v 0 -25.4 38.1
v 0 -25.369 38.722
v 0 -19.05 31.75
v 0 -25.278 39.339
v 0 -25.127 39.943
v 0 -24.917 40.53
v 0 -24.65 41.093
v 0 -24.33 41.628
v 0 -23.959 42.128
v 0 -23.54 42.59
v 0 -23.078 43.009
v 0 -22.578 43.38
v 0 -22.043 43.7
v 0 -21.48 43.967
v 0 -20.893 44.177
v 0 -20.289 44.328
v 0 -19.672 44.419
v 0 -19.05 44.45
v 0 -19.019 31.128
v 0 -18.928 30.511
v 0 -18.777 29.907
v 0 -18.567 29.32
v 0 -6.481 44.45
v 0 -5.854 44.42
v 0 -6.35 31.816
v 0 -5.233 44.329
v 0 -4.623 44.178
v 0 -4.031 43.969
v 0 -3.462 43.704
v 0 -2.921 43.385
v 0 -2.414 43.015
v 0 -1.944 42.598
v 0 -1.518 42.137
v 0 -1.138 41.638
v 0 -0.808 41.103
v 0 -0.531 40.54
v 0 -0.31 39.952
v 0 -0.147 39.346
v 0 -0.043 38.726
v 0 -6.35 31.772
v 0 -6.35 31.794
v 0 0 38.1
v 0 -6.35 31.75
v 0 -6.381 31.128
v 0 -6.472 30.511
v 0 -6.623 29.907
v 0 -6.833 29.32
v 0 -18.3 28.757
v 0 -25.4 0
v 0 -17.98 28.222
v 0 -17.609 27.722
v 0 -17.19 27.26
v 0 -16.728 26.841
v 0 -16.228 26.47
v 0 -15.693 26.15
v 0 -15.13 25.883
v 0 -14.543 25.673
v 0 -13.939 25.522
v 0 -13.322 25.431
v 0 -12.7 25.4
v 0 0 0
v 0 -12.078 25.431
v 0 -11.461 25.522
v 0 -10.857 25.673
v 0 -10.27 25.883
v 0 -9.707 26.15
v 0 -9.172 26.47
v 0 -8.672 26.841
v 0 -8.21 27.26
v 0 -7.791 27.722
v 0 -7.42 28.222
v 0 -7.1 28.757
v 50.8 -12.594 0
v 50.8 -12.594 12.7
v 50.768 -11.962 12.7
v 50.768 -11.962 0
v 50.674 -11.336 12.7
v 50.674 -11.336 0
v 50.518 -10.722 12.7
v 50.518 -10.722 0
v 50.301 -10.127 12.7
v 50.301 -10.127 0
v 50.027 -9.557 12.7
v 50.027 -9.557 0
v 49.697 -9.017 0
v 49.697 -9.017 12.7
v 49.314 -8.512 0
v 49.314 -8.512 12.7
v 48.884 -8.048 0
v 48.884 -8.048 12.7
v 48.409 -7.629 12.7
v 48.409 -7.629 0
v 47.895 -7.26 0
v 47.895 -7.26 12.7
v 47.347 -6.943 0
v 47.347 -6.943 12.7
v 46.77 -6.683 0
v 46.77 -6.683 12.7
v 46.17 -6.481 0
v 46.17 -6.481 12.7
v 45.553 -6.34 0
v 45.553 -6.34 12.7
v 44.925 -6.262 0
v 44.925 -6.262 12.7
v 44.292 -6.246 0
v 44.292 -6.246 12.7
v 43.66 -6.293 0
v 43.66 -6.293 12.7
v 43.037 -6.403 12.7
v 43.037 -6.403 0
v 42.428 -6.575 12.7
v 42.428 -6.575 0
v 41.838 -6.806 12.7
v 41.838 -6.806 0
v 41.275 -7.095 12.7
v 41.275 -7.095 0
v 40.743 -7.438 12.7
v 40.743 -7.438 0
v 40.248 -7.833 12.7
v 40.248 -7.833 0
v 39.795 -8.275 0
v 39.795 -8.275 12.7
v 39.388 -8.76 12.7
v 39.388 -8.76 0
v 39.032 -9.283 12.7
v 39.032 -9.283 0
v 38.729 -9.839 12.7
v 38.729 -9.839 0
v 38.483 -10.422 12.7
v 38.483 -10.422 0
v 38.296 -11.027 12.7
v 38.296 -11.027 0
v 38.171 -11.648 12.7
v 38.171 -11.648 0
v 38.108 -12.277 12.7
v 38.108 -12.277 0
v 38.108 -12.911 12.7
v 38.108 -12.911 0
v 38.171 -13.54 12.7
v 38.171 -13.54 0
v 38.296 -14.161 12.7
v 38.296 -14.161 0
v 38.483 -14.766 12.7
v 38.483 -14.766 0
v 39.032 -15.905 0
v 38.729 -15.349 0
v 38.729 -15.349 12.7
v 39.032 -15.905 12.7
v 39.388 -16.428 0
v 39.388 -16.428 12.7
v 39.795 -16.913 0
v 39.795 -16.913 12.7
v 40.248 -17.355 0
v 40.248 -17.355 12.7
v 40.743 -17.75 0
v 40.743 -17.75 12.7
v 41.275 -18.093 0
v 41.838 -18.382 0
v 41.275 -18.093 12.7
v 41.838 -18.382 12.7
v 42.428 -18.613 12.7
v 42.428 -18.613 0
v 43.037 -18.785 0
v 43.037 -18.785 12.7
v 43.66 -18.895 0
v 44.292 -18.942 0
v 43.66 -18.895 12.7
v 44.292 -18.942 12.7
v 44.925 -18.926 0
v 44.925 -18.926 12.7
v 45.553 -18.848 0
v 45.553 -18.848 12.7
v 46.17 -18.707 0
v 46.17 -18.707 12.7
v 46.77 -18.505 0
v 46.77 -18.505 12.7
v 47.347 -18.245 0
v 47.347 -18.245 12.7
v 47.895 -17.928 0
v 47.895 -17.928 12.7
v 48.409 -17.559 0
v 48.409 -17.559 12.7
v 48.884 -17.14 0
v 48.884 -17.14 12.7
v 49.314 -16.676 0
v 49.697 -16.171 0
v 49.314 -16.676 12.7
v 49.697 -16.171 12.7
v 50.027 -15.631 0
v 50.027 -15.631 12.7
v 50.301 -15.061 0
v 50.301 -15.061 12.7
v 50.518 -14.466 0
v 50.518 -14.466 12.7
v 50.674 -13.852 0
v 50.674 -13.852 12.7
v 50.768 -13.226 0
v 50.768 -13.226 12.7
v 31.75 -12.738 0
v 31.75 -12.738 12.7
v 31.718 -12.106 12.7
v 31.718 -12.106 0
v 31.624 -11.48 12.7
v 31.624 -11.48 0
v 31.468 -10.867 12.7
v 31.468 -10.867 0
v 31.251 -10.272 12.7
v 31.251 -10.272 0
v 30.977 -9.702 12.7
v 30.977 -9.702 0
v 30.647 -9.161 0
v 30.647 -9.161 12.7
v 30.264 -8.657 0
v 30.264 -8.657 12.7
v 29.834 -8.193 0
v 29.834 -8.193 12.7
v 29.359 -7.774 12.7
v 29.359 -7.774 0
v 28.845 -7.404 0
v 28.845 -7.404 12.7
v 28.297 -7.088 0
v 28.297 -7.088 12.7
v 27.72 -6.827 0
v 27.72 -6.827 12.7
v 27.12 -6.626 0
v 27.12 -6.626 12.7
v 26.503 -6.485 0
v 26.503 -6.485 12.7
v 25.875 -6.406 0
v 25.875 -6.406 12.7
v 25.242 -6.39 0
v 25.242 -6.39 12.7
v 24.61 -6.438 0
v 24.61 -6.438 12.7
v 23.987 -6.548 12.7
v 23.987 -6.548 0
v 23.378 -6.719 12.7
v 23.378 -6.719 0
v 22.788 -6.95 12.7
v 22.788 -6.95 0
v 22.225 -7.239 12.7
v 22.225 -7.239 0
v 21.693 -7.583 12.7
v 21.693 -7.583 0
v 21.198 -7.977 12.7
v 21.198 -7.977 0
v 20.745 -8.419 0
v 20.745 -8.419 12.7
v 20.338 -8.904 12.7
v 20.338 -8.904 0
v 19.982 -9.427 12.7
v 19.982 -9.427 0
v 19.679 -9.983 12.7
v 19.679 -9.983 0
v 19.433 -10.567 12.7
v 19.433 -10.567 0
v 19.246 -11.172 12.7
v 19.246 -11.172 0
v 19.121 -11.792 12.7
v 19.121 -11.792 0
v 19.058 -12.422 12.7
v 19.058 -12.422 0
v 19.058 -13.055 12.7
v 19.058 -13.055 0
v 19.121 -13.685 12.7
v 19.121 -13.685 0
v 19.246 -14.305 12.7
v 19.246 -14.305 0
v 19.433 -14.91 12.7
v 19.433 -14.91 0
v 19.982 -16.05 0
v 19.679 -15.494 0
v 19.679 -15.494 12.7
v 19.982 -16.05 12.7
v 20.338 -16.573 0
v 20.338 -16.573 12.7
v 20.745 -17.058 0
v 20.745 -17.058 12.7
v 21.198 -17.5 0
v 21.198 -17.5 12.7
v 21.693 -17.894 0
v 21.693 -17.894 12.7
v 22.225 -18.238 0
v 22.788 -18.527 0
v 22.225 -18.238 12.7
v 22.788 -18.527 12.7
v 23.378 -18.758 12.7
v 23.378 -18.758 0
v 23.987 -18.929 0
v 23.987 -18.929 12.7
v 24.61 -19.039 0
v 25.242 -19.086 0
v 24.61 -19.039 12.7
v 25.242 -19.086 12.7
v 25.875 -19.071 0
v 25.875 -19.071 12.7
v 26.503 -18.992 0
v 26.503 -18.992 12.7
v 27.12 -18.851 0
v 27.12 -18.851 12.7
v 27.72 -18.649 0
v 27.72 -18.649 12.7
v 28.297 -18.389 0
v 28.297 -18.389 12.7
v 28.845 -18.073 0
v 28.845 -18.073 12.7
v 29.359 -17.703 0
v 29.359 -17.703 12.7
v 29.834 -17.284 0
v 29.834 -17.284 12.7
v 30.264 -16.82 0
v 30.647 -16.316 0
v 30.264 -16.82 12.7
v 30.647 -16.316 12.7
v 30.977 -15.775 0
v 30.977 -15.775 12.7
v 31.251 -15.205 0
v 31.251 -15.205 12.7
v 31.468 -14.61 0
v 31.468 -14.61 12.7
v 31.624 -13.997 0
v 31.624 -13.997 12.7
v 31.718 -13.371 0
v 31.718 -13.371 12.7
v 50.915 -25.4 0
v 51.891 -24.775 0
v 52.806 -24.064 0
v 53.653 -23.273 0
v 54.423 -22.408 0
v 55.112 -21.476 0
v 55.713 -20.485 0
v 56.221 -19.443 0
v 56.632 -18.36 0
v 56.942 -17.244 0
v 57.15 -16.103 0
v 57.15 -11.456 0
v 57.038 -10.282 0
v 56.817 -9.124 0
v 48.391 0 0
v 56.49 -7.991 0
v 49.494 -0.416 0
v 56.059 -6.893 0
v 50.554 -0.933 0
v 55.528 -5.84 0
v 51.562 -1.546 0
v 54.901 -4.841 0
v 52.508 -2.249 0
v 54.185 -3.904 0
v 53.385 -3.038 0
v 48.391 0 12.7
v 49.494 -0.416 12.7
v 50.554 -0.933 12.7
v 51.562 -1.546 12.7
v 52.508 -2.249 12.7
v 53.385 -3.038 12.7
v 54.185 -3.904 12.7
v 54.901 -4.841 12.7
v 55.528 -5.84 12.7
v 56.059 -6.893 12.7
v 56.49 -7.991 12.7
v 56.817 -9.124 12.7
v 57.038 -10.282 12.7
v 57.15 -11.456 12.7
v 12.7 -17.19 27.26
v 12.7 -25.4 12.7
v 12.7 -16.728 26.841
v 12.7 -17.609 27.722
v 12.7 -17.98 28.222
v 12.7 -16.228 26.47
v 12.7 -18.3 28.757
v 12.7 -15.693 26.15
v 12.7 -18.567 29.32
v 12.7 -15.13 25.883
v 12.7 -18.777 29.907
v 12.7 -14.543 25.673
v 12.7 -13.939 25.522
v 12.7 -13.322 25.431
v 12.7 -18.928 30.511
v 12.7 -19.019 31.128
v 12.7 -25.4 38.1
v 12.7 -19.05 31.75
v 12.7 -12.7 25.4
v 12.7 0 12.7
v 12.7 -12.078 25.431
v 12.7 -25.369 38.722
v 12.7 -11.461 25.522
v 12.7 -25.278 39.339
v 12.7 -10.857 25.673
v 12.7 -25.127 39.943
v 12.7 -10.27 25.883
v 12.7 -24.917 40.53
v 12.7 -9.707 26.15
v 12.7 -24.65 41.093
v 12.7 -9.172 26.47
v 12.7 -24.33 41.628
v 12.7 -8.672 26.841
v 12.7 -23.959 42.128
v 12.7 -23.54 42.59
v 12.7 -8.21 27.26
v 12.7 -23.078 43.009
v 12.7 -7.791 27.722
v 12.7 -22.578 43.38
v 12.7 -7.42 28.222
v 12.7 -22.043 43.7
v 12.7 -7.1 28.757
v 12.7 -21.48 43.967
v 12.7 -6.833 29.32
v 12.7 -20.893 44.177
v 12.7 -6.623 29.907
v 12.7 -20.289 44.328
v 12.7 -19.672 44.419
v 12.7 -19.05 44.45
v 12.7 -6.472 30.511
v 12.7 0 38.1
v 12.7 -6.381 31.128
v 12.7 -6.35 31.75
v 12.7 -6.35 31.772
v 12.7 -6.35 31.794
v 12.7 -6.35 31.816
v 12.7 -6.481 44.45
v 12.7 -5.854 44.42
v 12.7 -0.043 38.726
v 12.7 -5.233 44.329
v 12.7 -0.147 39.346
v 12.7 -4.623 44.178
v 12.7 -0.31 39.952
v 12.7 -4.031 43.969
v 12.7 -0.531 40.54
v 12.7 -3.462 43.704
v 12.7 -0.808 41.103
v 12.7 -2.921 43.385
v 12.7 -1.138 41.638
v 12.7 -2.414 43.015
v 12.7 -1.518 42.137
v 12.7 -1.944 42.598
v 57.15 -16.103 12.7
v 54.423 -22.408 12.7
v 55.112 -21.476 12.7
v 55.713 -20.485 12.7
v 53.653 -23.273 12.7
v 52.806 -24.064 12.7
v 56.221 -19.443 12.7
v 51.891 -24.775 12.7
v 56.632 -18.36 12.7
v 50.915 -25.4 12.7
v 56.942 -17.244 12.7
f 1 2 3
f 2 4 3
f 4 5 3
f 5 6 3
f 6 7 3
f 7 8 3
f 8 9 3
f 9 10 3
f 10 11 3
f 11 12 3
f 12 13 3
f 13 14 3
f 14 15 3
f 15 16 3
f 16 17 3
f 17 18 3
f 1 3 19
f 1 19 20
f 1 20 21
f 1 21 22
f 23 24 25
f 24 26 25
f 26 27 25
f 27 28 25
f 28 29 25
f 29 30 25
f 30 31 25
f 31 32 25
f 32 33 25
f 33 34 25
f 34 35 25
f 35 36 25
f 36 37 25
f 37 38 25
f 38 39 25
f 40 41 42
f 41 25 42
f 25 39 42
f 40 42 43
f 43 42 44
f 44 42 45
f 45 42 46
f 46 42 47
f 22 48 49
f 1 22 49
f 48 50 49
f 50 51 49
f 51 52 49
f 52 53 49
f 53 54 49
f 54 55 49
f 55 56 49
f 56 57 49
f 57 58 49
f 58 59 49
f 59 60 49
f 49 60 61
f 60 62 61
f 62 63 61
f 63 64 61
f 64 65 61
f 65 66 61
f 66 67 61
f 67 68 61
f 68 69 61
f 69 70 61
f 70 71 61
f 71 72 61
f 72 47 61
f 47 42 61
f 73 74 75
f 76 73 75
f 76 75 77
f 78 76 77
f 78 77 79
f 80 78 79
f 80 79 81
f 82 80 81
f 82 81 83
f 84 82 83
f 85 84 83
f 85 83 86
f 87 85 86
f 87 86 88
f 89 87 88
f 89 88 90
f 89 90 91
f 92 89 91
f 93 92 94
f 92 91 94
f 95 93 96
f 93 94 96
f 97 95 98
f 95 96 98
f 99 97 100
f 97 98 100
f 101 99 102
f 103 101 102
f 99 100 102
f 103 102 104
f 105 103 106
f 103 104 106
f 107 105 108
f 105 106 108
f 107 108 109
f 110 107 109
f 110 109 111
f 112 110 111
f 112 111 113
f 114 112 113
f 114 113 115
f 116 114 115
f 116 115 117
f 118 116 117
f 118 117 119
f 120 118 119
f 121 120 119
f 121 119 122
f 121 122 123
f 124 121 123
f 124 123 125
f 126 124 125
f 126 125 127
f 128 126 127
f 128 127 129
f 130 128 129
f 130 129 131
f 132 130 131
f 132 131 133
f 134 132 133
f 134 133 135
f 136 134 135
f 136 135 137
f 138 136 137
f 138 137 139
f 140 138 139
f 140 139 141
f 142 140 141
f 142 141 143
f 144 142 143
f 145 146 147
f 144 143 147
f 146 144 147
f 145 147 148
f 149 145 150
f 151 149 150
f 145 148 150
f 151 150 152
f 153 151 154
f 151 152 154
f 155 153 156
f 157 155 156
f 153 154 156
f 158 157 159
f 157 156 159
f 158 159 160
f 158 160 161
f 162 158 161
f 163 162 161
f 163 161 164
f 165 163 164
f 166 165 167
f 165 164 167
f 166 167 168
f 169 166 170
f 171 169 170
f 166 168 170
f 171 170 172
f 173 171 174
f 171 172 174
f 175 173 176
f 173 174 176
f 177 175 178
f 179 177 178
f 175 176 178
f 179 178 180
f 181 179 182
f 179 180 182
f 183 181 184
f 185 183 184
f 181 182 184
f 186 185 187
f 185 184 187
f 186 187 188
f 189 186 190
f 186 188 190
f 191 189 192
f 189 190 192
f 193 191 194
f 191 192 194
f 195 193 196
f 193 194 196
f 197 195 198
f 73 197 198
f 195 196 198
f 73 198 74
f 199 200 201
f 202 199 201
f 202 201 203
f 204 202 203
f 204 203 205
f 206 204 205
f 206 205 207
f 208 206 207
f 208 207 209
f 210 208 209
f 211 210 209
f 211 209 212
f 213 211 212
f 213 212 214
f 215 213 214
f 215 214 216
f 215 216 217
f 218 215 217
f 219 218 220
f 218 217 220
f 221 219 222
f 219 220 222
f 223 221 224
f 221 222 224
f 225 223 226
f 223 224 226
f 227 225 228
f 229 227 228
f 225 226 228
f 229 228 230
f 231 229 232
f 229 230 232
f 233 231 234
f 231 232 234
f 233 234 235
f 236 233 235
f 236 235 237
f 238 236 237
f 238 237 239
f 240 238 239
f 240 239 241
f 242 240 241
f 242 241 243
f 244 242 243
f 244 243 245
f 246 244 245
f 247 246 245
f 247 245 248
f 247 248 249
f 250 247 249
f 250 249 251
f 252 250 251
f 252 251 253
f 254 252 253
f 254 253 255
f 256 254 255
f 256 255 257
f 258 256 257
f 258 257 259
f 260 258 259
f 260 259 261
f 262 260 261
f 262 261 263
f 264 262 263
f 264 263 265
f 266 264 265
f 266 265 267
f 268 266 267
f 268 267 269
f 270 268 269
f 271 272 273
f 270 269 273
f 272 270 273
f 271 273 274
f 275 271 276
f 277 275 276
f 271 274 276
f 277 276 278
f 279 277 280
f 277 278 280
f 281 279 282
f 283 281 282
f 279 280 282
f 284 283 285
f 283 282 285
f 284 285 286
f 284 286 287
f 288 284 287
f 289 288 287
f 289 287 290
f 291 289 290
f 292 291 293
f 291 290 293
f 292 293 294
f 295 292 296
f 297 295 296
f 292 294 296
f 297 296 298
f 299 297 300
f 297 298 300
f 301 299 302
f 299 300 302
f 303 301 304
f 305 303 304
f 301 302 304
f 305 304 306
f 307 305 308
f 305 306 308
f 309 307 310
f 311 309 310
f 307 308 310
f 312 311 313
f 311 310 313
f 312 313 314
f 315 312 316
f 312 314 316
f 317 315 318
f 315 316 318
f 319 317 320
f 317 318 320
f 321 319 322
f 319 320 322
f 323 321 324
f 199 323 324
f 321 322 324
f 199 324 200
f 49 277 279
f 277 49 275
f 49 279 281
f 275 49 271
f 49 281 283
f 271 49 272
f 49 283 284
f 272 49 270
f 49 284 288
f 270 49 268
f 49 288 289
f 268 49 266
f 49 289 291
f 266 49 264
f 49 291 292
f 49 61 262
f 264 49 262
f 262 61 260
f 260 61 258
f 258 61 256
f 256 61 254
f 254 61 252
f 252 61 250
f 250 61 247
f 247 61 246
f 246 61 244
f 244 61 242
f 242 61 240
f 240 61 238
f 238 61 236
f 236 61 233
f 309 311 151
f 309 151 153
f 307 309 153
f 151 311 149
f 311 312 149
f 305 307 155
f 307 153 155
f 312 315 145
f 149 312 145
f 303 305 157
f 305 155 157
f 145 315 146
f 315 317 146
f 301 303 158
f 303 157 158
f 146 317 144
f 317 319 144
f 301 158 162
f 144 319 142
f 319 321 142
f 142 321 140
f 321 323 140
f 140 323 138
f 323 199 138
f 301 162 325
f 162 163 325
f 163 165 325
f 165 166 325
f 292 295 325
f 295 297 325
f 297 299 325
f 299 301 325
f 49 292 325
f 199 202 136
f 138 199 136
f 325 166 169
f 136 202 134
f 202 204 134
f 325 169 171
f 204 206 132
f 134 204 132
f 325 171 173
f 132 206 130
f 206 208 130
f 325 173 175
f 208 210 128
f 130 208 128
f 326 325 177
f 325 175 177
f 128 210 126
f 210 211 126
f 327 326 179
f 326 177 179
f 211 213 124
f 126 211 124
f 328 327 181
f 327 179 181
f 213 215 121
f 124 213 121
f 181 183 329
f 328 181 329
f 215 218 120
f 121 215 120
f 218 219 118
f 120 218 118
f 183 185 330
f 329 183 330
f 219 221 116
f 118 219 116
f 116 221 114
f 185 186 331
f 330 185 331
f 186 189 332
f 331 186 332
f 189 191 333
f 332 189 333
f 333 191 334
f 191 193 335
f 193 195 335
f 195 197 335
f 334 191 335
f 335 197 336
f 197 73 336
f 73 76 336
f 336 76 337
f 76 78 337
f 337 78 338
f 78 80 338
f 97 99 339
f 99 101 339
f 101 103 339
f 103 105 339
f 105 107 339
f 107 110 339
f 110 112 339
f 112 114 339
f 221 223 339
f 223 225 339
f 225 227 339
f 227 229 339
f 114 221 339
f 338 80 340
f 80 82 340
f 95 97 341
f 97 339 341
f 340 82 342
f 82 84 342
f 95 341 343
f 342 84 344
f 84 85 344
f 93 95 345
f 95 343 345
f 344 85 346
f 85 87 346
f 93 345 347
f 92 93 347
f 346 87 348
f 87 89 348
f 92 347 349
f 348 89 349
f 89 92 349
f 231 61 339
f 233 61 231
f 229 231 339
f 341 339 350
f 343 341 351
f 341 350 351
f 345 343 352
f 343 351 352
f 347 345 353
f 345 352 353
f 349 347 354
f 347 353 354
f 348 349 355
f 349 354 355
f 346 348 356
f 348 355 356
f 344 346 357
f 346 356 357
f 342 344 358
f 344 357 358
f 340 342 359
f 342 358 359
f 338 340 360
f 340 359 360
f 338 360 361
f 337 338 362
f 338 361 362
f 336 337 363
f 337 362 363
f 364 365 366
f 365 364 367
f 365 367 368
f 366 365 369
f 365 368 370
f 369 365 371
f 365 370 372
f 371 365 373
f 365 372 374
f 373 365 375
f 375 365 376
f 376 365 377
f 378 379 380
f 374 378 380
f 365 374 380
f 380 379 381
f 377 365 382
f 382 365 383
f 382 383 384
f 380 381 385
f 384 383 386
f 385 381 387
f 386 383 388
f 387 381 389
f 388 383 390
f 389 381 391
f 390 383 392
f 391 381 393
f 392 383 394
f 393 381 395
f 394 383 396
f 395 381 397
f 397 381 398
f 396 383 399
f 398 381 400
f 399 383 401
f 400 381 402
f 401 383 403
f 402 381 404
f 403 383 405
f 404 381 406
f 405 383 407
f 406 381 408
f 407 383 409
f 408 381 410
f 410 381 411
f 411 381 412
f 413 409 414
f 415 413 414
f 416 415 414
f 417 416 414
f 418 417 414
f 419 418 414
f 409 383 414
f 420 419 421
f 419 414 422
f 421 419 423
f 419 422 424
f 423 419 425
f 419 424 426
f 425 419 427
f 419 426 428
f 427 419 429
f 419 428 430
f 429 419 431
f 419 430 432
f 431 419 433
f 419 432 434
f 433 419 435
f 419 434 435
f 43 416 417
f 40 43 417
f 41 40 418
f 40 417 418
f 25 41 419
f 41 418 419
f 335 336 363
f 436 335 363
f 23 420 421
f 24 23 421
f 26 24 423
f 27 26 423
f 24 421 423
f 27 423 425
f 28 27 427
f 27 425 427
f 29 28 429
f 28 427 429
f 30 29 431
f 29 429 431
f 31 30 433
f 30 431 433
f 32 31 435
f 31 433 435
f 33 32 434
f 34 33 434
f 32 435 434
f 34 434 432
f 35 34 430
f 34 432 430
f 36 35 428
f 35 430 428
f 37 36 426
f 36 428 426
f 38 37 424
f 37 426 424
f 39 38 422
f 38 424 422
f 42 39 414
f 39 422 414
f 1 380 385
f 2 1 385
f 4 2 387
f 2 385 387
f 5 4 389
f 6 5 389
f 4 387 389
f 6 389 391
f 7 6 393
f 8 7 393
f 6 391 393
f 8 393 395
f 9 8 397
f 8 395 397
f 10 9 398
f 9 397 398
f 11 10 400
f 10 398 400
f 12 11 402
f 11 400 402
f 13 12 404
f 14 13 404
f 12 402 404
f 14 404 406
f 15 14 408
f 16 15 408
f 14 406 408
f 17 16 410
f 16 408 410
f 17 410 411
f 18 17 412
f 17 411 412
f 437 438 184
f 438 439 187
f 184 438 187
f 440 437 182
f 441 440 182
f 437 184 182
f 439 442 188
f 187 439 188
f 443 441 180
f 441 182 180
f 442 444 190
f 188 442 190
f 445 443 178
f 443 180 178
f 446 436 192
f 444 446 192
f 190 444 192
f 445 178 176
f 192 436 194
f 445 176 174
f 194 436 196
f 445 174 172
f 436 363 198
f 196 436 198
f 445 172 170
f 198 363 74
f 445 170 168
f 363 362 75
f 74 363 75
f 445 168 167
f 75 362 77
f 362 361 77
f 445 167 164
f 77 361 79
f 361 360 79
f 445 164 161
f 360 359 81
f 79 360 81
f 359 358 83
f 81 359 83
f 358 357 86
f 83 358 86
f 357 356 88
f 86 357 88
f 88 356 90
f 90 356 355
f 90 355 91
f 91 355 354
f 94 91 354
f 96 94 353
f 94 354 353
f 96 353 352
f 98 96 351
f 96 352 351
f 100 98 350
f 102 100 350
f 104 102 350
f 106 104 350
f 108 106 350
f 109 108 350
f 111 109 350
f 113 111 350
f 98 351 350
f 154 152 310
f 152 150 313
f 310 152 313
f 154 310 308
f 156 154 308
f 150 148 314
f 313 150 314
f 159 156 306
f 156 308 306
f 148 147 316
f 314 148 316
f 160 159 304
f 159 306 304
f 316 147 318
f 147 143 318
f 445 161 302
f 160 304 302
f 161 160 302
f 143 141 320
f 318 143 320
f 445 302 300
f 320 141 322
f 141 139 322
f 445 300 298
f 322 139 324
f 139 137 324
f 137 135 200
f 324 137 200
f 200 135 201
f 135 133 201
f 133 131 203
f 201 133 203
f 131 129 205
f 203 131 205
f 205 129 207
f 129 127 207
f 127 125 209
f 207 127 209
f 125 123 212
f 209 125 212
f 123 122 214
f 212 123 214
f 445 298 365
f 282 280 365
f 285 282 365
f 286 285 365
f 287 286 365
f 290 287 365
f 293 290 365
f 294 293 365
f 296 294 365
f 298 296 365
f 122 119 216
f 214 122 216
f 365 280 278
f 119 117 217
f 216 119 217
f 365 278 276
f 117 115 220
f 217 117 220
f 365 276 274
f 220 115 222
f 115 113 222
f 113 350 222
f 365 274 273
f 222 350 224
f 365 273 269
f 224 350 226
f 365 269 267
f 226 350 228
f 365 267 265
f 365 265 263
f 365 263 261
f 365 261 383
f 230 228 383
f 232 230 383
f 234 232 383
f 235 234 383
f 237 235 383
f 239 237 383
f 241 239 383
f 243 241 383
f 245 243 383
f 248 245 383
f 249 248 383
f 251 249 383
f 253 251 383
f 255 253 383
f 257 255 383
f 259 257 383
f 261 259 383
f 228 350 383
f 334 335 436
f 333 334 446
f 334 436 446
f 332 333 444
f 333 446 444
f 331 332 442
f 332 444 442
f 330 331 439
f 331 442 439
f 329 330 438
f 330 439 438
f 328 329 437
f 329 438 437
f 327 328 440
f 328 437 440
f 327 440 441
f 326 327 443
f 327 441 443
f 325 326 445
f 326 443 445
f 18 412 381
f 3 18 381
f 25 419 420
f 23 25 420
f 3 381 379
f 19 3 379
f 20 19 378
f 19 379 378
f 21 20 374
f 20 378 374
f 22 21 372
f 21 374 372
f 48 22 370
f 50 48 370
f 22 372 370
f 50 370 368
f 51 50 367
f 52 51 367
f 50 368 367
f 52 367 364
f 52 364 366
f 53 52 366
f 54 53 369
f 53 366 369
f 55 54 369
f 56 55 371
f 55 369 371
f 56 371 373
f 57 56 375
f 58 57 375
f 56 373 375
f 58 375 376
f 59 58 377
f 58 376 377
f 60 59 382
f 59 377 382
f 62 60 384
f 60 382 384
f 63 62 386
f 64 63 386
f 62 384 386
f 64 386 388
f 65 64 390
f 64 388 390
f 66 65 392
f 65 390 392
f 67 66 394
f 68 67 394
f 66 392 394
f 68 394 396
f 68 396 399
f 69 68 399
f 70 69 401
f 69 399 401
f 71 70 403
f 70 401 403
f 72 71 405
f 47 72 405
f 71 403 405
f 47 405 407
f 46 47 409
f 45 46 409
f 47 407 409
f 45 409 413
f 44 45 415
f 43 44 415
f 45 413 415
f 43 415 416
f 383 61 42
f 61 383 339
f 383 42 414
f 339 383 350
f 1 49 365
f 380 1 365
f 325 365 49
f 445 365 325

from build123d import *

# Parameters (mm, degrees)
F1_DEPTH = 25.4
F3_DEPTH = 12.7
F4_R     = 6.35
F5_DEPTH = 25.4


# Not quite as in the source:
# - ends of sketch curves that miss each other by under 0.0002 mm in the source are joined


with BuildPart() as f1:
    # F0 (on Front) → F1 (new body)
    with BuildSketch(Plane.XZ):
        Polygon((0, 44.45), (0, 0), (57.15, 0), (57.15, 12.7), (12.7, 12.7), (12.7, 44.45), align=None)
    extrude(amount=F1_DEPTH)

    # F2 (on face) → F3 (cut)
    with BuildSketch(Plane.YZ.offset(12.7)):
        with BuildLine():
            Line((-12.7, 31.75), (-19.05, 31.75))
            ThreePointArc((-19.05, 31.75), (-12.7, 25.4), (-6.35, 31.75))
            Line((-6.35, 31.75), (-12.7, 31.75))
        make_face()
        with BuildLine():
            Line((-19.05, 44.45), (-19.05, 31.75))
            ThreePointArc((-19.05, 31.75), (-12.732894977, 38.0999147963), (-6.3503408124, 31.8157890712))
            Line((-6.3503408124, 31.8157890712), (-6.4812591328, 44.45))
            Line((-6.4812591328, 44.45), (-19.05, 44.45))
        make_face()
        with BuildLine():
            ThreePointArc((-6.3503408124, 31.8157890712), (-12.732894977, 38.0999147963), (-19.05, 31.75))
            Line((-19.05, 31.75), (-12.7, 31.75))
            Line((-12.7, 31.75), (-6.35, 31.75))
            ThreePointArc((-6.35, 31.75), (-6.3500852037, 31.782894977), (-6.3503408124, 31.8157890712))
        make_face()
        with BuildLine():
            ThreePointArc((-25.4, 38.1), (-23.5401280605, 42.5901280605), (-19.05, 44.45))
            Line((-19.05, 44.45), (-25.4, 44.45))
            Line((-25.4, 44.45), (-25.4, 38.1))
        make_face()
        with BuildLine():
            Line((0, 44.45), (-6.4812591328, 44.45))
            ThreePointArc((-6.4812591328, 44.45), (-1.9444866031, 42.597935184), (0, 38.1))
            Line((0, 38.1), (0, 44.45))
        make_face()
    extrude(amount=-F3_DEPTH, mode=Mode.SUBTRACT)

    # F4 (on face) → F5 (cut)
    with BuildSketch(Plane.XY.offset(12.7)):
        with Locations((25.4, -12.7384394317)):
            Circle(F4_R)
        with Locations((44.45, -12.5940097496)):
            Circle(F4_R)
        with BuildLine():
            ThreePointArc((48.39091748, 0), (54.5541990648, -4.3642287783), (57.15, -11.4560797516))
            Line((57.15, -11.4560797516), (57.15, 0))
            Line((57.15, 0), (48.39091748, 0))
        make_face()
        with BuildLine():
            Line((57.15, -25.4), (57.15, -16.1034604334))
            ThreePointArc((57.15, -16.1034604334), (55.1119721944, -21.4757258052), (50.91496557, -25.4))
            Line((50.91496557, -25.4), (57.15, -25.4))
        make_face()
    extrude(amount=-F5_DEPTH, mode=Mode.SUBTRACT)


solid = f1.part
